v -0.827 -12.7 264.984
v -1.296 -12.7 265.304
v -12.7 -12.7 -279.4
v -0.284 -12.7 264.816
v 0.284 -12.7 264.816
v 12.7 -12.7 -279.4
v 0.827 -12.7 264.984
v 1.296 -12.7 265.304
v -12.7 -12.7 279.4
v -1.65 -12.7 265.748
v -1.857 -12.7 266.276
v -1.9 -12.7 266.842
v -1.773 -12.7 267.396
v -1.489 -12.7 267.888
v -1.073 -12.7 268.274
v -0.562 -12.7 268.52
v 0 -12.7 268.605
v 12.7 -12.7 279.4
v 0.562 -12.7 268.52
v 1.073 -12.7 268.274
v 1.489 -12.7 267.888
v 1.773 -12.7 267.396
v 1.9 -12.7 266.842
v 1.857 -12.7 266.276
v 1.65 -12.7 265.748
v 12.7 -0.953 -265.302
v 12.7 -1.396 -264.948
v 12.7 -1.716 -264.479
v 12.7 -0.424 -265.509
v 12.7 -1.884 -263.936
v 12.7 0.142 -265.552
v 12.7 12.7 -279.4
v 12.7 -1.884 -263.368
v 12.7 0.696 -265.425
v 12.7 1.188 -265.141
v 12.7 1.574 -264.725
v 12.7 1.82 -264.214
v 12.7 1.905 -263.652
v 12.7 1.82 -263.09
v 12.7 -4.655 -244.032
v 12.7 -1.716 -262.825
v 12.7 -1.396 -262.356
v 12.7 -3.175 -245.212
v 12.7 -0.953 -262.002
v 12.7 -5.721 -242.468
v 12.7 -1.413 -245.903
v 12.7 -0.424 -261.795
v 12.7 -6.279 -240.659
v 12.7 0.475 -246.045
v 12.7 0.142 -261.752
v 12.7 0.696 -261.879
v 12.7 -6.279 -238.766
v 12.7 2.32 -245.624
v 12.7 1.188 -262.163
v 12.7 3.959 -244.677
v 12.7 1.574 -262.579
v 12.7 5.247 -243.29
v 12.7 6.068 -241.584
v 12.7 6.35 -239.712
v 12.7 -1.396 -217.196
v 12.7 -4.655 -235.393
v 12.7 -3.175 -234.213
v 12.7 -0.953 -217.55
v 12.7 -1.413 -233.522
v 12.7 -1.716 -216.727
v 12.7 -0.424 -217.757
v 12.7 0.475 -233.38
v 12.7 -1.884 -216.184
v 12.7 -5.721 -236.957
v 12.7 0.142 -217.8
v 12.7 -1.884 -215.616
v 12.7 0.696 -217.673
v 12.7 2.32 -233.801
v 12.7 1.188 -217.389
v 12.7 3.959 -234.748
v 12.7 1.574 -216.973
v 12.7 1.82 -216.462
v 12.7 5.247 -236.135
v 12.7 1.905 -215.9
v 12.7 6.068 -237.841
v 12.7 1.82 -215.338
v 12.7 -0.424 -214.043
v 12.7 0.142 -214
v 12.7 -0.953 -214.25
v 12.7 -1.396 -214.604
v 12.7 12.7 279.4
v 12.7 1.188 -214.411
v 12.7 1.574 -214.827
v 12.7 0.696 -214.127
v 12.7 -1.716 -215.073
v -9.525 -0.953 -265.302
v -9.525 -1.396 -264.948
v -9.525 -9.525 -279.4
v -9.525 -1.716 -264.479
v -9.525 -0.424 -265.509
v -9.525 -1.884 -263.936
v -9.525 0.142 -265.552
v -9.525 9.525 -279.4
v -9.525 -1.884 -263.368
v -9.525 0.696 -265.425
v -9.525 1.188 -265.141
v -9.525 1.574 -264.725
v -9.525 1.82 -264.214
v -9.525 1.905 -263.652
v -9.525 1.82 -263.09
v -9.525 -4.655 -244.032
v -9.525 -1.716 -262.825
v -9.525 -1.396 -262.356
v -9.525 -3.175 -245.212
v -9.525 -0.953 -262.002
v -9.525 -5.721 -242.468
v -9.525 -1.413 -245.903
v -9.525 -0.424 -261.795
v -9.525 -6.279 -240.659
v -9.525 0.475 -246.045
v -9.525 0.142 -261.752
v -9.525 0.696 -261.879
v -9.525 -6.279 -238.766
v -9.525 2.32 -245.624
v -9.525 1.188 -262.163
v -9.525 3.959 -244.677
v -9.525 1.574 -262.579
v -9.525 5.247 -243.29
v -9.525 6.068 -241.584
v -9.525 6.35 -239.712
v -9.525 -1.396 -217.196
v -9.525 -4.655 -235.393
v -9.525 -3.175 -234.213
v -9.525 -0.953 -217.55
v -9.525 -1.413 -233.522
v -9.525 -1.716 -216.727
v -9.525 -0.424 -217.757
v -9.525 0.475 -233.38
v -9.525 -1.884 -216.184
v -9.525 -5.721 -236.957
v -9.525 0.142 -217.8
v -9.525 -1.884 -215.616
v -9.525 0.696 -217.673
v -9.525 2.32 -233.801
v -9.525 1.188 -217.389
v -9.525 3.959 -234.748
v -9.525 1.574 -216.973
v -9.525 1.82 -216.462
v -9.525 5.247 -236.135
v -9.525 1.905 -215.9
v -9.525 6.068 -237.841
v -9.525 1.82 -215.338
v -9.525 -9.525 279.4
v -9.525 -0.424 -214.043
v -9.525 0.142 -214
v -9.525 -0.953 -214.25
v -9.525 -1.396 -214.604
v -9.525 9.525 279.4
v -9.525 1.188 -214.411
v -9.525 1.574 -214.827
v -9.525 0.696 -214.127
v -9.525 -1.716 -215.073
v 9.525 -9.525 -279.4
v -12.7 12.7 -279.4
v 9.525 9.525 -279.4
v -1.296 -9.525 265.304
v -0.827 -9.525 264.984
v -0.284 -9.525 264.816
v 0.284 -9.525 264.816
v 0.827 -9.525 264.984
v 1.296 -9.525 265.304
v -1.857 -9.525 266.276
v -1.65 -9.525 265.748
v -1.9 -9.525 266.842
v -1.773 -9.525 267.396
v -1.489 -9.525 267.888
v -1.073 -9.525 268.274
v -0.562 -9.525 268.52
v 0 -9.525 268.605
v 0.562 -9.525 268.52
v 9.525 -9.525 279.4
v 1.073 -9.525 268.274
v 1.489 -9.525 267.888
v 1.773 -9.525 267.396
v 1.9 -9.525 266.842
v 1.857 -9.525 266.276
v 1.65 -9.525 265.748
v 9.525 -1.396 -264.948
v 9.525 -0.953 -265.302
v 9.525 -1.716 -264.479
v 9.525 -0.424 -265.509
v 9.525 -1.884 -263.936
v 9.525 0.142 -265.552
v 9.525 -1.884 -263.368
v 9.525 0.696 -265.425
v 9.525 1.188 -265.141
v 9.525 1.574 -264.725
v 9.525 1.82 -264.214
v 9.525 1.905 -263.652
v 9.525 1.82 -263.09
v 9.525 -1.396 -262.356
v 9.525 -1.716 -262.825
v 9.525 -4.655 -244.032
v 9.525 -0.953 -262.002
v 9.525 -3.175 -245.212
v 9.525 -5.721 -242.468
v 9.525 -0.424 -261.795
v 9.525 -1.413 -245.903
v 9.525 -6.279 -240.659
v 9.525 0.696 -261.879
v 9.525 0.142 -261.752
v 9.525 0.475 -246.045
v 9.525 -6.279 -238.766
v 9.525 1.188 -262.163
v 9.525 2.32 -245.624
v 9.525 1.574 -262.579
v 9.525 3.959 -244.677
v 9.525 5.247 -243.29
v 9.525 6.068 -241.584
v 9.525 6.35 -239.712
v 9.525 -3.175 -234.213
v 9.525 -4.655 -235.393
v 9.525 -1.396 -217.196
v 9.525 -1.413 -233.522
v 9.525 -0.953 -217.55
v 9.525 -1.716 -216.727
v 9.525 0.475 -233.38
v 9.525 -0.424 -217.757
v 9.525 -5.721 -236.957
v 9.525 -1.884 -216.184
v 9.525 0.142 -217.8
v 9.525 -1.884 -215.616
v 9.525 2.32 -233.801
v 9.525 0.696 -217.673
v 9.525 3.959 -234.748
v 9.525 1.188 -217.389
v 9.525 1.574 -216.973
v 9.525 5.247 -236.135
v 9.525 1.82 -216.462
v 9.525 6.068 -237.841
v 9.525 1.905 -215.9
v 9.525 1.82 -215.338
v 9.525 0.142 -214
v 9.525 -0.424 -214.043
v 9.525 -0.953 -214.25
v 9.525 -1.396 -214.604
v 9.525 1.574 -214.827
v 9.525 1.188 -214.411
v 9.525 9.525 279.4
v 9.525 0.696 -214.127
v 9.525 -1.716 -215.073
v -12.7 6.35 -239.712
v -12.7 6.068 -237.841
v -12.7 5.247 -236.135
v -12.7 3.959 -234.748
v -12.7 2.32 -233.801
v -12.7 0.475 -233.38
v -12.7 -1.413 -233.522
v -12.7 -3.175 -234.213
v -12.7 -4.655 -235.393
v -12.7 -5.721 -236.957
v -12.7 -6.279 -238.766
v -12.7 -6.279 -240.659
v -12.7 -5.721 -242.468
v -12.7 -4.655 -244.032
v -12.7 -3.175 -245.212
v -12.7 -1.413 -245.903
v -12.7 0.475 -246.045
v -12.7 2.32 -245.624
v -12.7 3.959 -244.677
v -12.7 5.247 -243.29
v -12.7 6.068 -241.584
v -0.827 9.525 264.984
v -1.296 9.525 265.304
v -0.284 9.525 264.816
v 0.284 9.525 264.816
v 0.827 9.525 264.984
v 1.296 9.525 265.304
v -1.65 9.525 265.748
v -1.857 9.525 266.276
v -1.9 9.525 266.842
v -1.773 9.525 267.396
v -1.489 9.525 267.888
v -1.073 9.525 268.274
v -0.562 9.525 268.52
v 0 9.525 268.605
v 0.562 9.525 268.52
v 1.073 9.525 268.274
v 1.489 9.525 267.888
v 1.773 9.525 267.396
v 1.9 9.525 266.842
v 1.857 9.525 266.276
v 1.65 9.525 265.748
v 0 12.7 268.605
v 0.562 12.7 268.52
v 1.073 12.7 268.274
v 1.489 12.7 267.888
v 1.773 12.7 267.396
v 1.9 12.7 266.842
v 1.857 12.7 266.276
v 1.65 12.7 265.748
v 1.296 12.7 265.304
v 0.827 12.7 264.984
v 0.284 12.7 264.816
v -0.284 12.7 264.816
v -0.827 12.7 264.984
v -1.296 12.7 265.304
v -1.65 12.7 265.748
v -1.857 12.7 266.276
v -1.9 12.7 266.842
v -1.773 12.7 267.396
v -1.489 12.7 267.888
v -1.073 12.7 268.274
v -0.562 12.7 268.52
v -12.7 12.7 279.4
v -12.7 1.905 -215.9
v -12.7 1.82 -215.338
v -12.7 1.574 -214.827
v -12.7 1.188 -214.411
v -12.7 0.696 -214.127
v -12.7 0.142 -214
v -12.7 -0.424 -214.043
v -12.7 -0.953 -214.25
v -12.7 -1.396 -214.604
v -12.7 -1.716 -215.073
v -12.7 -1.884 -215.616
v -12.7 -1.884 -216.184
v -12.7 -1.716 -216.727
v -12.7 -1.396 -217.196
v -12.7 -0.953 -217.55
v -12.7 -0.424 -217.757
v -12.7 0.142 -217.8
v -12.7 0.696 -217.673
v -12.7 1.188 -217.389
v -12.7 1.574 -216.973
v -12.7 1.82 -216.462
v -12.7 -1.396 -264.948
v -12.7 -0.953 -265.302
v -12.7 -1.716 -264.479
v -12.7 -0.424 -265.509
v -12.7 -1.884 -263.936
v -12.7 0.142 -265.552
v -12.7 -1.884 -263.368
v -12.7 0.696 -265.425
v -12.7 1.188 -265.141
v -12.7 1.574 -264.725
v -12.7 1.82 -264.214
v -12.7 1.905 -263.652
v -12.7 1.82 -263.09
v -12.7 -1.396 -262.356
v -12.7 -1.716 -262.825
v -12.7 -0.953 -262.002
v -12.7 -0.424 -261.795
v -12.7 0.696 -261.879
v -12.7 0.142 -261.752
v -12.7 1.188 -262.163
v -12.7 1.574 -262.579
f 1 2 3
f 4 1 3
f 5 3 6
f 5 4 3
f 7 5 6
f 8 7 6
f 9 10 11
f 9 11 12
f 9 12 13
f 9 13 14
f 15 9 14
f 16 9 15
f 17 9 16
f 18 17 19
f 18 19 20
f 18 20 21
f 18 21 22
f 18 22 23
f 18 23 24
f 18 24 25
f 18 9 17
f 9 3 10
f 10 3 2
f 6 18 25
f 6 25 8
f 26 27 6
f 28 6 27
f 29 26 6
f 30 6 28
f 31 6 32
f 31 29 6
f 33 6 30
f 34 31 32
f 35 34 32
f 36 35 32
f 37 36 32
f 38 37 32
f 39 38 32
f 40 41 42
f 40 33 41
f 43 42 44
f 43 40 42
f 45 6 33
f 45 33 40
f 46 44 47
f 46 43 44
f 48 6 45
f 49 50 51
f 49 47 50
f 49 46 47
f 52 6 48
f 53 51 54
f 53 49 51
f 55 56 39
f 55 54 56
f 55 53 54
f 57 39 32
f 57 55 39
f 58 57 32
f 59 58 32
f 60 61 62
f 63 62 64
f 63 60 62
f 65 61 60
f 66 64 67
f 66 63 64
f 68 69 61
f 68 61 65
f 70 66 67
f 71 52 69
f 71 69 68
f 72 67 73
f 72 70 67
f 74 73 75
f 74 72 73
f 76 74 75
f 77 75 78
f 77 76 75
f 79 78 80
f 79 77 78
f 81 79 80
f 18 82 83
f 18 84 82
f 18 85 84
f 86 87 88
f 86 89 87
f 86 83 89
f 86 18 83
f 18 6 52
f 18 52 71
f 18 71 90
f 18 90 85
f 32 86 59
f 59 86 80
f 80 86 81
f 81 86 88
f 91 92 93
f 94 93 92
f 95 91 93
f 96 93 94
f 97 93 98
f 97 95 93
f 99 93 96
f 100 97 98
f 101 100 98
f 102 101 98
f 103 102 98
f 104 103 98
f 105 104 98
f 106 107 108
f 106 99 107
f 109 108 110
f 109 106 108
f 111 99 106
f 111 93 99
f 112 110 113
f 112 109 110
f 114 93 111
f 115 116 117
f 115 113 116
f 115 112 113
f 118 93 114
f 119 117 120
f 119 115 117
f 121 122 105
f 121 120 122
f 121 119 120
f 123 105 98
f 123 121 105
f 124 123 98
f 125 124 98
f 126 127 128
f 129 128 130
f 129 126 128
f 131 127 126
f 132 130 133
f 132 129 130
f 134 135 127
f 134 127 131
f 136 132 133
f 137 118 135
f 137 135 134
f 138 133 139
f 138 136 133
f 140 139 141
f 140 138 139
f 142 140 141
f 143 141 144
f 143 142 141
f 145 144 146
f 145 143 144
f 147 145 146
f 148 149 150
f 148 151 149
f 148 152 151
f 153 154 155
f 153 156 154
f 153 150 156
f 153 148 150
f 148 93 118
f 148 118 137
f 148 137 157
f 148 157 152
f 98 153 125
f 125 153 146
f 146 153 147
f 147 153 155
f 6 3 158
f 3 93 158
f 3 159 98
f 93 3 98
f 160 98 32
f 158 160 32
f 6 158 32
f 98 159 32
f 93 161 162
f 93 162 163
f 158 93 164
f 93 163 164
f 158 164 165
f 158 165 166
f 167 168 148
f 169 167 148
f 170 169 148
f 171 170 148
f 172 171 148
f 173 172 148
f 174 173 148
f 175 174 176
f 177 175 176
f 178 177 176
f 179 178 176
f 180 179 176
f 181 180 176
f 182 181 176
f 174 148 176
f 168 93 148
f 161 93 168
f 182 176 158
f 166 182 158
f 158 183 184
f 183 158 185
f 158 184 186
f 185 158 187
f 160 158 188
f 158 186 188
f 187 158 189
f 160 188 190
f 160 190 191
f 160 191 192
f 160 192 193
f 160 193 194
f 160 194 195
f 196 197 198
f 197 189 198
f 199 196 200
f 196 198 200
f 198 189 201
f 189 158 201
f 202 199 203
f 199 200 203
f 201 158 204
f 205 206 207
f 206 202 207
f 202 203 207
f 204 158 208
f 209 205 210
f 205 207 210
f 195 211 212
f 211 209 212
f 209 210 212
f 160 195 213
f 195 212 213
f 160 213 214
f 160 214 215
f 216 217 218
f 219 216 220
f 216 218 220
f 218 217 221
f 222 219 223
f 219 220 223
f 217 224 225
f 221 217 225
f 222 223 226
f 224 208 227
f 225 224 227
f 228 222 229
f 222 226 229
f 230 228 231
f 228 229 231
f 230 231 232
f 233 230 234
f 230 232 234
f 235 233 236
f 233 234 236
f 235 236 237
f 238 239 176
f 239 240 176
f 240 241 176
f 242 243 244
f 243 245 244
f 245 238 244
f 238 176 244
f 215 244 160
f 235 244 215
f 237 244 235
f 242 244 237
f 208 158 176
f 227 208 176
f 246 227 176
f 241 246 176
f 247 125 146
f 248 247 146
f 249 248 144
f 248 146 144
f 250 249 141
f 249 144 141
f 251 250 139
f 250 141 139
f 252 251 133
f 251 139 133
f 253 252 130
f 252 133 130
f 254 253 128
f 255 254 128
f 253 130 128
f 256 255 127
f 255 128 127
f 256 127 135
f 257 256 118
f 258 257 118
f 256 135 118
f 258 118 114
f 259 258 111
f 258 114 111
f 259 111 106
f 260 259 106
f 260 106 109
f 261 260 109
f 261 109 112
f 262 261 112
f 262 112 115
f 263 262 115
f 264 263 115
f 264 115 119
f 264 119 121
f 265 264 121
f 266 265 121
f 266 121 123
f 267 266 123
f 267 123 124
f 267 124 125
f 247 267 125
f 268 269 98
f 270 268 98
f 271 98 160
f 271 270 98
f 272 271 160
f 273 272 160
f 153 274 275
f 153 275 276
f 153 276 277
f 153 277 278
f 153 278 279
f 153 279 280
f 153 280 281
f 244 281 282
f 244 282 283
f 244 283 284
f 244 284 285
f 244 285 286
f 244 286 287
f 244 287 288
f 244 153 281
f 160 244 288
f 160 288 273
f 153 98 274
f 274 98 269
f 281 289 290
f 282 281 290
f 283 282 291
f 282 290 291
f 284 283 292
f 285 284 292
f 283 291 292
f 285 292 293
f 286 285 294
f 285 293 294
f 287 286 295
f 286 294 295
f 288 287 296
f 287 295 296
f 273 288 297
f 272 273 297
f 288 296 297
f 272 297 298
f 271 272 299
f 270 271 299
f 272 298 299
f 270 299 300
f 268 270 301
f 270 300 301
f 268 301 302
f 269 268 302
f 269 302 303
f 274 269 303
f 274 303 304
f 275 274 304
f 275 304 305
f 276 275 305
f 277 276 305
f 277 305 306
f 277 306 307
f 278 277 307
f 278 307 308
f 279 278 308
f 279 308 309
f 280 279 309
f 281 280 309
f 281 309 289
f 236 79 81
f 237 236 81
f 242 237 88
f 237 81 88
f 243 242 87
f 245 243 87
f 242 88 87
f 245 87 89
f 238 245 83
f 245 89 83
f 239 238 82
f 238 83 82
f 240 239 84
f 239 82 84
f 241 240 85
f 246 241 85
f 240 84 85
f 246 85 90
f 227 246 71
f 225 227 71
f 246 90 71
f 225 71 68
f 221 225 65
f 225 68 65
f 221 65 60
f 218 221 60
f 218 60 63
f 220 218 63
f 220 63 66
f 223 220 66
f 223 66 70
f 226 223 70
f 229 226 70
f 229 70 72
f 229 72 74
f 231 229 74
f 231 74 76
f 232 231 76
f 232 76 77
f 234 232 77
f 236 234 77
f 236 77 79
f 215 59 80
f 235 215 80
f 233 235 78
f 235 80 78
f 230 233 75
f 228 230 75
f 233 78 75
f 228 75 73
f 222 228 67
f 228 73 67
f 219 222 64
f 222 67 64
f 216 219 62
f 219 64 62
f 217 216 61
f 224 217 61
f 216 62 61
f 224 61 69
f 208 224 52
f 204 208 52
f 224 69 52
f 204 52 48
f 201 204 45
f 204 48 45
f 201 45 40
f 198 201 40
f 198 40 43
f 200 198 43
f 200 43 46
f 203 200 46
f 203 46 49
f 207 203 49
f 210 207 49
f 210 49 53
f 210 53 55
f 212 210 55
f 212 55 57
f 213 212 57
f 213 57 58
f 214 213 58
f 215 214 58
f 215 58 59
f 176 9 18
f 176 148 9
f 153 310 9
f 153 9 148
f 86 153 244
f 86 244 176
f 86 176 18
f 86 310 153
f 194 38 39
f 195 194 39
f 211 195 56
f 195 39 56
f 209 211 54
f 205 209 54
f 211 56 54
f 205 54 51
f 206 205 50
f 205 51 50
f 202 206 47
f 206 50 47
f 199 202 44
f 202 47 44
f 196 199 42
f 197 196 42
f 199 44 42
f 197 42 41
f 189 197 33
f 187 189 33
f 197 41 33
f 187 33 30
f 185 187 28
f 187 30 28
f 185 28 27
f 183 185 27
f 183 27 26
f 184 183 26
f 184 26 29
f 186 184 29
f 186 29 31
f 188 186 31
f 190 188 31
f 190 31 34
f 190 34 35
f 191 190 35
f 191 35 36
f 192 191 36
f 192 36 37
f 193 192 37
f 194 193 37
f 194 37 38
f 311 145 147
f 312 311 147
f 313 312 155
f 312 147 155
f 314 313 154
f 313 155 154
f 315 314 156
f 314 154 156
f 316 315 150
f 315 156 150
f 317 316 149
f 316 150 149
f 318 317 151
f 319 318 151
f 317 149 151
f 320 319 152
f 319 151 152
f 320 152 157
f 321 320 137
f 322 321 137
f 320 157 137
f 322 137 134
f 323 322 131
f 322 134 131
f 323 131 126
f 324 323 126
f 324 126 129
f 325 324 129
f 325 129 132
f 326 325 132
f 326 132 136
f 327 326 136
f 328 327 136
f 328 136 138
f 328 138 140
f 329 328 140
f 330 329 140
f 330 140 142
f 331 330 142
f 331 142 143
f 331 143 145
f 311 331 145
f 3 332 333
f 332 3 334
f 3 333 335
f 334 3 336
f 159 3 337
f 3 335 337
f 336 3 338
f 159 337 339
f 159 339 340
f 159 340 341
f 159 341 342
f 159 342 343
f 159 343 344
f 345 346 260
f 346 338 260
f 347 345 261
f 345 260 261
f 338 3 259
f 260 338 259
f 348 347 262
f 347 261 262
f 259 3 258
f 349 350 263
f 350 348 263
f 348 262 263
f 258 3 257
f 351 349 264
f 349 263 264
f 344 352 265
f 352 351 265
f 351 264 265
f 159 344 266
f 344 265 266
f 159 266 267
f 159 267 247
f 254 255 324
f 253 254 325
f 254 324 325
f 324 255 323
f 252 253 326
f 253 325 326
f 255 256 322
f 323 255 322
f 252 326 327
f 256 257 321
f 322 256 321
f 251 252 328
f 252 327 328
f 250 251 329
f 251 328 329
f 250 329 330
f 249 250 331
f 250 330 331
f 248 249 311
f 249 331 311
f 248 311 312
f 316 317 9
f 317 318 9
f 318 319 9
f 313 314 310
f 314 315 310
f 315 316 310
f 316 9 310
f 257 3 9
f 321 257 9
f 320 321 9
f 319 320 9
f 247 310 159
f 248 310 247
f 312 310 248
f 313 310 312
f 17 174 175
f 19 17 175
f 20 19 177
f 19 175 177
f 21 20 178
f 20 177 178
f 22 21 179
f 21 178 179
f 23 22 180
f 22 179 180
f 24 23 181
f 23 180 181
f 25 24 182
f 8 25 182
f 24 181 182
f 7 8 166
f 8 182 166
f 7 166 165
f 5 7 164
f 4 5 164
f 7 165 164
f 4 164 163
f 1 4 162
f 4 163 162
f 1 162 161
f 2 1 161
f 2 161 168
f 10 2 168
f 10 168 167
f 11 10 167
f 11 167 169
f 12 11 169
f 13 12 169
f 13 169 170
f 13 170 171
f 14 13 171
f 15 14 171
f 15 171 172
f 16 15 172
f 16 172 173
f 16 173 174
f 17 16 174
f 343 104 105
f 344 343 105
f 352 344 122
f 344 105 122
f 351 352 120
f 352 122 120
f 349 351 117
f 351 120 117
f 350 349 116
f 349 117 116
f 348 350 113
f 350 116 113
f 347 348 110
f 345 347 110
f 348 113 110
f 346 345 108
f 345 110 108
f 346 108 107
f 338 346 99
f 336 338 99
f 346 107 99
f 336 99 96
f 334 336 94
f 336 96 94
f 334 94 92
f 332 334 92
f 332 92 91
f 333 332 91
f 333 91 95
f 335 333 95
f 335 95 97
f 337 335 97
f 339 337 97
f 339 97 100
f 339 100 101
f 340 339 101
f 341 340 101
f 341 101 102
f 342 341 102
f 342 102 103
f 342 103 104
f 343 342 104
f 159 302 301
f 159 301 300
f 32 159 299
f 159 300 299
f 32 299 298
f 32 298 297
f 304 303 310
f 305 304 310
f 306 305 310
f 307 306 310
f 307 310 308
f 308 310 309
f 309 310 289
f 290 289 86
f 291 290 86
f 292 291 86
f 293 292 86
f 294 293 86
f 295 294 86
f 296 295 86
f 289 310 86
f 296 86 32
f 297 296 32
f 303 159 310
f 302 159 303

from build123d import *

# Parameters (mm, degrees)
SKETCH1_W           = 25.4
SKETCH1_H           = 25.4
SKETCH1_W_2         = 19.05
SKETCH1_H_2         = 19.05
BOSS_EXTRUDE1_DEPTH = 279.4
SKETCH7_R           = 1.905
CUT_EXTRUDE1_DEPTH  = 281.839473721
SKETCH8_R           = 1.905
SKETCH8_R_2         = 6.35
CUT_EXTRUDE2_DEPTH  = 281.839473721


with BuildPart() as part:
    # Sketch1 → Boss-Extrude1 (new, symmetric)
    with BuildSketch(Plane.XY):
        Rectangle(SKETCH1_W, SKETCH1_H)
        Rectangle(SKETCH1_W_2, SKETCH1_H_2, mode=Mode.SUBTRACT)
    extrude(amount=BOSS_EXTRUDE1_DEPTH, both=True)

    # Sketch7 → Cut-Extrude1 (cut, through all)
    with BuildSketch(Plane(origin=(0, 12.7, 0), x_dir=(1, 0, 0), z_dir=(0, 1, 0))):
        with Locations(Location((0, -266.7, 0), (0, 0, 270))):
            Circle(SKETCH7_R)
    extrude(amount=-CUT_EXTRUDE1_DEPTH, mode=Mode.SUBTRACT)

    # Sketch8 → Cut-Extrude2 (cut, through all)
    with BuildSketch(Plane(origin=(12.7, 0, 0), x_dir=(0, 0, -1), z_dir=(1, 0, 0))):
        with Locations(Location((215.9, 0, 0), (0, 0, 90))):
            Circle(SKETCH8_R)
        with Locations(Location((263.652, 0, 0), (0, 0, 90))):
            Circle(SKETCH8_R)
        with Locations(Location((239.7125, 0, 0), (0, 0, 90))):
            Circle(SKETCH8_R_2)
    extrude(amount=-CUT_EXTRUDE2_DEPTH, mode=Mode.SUBTRACT)


solid = part.part
